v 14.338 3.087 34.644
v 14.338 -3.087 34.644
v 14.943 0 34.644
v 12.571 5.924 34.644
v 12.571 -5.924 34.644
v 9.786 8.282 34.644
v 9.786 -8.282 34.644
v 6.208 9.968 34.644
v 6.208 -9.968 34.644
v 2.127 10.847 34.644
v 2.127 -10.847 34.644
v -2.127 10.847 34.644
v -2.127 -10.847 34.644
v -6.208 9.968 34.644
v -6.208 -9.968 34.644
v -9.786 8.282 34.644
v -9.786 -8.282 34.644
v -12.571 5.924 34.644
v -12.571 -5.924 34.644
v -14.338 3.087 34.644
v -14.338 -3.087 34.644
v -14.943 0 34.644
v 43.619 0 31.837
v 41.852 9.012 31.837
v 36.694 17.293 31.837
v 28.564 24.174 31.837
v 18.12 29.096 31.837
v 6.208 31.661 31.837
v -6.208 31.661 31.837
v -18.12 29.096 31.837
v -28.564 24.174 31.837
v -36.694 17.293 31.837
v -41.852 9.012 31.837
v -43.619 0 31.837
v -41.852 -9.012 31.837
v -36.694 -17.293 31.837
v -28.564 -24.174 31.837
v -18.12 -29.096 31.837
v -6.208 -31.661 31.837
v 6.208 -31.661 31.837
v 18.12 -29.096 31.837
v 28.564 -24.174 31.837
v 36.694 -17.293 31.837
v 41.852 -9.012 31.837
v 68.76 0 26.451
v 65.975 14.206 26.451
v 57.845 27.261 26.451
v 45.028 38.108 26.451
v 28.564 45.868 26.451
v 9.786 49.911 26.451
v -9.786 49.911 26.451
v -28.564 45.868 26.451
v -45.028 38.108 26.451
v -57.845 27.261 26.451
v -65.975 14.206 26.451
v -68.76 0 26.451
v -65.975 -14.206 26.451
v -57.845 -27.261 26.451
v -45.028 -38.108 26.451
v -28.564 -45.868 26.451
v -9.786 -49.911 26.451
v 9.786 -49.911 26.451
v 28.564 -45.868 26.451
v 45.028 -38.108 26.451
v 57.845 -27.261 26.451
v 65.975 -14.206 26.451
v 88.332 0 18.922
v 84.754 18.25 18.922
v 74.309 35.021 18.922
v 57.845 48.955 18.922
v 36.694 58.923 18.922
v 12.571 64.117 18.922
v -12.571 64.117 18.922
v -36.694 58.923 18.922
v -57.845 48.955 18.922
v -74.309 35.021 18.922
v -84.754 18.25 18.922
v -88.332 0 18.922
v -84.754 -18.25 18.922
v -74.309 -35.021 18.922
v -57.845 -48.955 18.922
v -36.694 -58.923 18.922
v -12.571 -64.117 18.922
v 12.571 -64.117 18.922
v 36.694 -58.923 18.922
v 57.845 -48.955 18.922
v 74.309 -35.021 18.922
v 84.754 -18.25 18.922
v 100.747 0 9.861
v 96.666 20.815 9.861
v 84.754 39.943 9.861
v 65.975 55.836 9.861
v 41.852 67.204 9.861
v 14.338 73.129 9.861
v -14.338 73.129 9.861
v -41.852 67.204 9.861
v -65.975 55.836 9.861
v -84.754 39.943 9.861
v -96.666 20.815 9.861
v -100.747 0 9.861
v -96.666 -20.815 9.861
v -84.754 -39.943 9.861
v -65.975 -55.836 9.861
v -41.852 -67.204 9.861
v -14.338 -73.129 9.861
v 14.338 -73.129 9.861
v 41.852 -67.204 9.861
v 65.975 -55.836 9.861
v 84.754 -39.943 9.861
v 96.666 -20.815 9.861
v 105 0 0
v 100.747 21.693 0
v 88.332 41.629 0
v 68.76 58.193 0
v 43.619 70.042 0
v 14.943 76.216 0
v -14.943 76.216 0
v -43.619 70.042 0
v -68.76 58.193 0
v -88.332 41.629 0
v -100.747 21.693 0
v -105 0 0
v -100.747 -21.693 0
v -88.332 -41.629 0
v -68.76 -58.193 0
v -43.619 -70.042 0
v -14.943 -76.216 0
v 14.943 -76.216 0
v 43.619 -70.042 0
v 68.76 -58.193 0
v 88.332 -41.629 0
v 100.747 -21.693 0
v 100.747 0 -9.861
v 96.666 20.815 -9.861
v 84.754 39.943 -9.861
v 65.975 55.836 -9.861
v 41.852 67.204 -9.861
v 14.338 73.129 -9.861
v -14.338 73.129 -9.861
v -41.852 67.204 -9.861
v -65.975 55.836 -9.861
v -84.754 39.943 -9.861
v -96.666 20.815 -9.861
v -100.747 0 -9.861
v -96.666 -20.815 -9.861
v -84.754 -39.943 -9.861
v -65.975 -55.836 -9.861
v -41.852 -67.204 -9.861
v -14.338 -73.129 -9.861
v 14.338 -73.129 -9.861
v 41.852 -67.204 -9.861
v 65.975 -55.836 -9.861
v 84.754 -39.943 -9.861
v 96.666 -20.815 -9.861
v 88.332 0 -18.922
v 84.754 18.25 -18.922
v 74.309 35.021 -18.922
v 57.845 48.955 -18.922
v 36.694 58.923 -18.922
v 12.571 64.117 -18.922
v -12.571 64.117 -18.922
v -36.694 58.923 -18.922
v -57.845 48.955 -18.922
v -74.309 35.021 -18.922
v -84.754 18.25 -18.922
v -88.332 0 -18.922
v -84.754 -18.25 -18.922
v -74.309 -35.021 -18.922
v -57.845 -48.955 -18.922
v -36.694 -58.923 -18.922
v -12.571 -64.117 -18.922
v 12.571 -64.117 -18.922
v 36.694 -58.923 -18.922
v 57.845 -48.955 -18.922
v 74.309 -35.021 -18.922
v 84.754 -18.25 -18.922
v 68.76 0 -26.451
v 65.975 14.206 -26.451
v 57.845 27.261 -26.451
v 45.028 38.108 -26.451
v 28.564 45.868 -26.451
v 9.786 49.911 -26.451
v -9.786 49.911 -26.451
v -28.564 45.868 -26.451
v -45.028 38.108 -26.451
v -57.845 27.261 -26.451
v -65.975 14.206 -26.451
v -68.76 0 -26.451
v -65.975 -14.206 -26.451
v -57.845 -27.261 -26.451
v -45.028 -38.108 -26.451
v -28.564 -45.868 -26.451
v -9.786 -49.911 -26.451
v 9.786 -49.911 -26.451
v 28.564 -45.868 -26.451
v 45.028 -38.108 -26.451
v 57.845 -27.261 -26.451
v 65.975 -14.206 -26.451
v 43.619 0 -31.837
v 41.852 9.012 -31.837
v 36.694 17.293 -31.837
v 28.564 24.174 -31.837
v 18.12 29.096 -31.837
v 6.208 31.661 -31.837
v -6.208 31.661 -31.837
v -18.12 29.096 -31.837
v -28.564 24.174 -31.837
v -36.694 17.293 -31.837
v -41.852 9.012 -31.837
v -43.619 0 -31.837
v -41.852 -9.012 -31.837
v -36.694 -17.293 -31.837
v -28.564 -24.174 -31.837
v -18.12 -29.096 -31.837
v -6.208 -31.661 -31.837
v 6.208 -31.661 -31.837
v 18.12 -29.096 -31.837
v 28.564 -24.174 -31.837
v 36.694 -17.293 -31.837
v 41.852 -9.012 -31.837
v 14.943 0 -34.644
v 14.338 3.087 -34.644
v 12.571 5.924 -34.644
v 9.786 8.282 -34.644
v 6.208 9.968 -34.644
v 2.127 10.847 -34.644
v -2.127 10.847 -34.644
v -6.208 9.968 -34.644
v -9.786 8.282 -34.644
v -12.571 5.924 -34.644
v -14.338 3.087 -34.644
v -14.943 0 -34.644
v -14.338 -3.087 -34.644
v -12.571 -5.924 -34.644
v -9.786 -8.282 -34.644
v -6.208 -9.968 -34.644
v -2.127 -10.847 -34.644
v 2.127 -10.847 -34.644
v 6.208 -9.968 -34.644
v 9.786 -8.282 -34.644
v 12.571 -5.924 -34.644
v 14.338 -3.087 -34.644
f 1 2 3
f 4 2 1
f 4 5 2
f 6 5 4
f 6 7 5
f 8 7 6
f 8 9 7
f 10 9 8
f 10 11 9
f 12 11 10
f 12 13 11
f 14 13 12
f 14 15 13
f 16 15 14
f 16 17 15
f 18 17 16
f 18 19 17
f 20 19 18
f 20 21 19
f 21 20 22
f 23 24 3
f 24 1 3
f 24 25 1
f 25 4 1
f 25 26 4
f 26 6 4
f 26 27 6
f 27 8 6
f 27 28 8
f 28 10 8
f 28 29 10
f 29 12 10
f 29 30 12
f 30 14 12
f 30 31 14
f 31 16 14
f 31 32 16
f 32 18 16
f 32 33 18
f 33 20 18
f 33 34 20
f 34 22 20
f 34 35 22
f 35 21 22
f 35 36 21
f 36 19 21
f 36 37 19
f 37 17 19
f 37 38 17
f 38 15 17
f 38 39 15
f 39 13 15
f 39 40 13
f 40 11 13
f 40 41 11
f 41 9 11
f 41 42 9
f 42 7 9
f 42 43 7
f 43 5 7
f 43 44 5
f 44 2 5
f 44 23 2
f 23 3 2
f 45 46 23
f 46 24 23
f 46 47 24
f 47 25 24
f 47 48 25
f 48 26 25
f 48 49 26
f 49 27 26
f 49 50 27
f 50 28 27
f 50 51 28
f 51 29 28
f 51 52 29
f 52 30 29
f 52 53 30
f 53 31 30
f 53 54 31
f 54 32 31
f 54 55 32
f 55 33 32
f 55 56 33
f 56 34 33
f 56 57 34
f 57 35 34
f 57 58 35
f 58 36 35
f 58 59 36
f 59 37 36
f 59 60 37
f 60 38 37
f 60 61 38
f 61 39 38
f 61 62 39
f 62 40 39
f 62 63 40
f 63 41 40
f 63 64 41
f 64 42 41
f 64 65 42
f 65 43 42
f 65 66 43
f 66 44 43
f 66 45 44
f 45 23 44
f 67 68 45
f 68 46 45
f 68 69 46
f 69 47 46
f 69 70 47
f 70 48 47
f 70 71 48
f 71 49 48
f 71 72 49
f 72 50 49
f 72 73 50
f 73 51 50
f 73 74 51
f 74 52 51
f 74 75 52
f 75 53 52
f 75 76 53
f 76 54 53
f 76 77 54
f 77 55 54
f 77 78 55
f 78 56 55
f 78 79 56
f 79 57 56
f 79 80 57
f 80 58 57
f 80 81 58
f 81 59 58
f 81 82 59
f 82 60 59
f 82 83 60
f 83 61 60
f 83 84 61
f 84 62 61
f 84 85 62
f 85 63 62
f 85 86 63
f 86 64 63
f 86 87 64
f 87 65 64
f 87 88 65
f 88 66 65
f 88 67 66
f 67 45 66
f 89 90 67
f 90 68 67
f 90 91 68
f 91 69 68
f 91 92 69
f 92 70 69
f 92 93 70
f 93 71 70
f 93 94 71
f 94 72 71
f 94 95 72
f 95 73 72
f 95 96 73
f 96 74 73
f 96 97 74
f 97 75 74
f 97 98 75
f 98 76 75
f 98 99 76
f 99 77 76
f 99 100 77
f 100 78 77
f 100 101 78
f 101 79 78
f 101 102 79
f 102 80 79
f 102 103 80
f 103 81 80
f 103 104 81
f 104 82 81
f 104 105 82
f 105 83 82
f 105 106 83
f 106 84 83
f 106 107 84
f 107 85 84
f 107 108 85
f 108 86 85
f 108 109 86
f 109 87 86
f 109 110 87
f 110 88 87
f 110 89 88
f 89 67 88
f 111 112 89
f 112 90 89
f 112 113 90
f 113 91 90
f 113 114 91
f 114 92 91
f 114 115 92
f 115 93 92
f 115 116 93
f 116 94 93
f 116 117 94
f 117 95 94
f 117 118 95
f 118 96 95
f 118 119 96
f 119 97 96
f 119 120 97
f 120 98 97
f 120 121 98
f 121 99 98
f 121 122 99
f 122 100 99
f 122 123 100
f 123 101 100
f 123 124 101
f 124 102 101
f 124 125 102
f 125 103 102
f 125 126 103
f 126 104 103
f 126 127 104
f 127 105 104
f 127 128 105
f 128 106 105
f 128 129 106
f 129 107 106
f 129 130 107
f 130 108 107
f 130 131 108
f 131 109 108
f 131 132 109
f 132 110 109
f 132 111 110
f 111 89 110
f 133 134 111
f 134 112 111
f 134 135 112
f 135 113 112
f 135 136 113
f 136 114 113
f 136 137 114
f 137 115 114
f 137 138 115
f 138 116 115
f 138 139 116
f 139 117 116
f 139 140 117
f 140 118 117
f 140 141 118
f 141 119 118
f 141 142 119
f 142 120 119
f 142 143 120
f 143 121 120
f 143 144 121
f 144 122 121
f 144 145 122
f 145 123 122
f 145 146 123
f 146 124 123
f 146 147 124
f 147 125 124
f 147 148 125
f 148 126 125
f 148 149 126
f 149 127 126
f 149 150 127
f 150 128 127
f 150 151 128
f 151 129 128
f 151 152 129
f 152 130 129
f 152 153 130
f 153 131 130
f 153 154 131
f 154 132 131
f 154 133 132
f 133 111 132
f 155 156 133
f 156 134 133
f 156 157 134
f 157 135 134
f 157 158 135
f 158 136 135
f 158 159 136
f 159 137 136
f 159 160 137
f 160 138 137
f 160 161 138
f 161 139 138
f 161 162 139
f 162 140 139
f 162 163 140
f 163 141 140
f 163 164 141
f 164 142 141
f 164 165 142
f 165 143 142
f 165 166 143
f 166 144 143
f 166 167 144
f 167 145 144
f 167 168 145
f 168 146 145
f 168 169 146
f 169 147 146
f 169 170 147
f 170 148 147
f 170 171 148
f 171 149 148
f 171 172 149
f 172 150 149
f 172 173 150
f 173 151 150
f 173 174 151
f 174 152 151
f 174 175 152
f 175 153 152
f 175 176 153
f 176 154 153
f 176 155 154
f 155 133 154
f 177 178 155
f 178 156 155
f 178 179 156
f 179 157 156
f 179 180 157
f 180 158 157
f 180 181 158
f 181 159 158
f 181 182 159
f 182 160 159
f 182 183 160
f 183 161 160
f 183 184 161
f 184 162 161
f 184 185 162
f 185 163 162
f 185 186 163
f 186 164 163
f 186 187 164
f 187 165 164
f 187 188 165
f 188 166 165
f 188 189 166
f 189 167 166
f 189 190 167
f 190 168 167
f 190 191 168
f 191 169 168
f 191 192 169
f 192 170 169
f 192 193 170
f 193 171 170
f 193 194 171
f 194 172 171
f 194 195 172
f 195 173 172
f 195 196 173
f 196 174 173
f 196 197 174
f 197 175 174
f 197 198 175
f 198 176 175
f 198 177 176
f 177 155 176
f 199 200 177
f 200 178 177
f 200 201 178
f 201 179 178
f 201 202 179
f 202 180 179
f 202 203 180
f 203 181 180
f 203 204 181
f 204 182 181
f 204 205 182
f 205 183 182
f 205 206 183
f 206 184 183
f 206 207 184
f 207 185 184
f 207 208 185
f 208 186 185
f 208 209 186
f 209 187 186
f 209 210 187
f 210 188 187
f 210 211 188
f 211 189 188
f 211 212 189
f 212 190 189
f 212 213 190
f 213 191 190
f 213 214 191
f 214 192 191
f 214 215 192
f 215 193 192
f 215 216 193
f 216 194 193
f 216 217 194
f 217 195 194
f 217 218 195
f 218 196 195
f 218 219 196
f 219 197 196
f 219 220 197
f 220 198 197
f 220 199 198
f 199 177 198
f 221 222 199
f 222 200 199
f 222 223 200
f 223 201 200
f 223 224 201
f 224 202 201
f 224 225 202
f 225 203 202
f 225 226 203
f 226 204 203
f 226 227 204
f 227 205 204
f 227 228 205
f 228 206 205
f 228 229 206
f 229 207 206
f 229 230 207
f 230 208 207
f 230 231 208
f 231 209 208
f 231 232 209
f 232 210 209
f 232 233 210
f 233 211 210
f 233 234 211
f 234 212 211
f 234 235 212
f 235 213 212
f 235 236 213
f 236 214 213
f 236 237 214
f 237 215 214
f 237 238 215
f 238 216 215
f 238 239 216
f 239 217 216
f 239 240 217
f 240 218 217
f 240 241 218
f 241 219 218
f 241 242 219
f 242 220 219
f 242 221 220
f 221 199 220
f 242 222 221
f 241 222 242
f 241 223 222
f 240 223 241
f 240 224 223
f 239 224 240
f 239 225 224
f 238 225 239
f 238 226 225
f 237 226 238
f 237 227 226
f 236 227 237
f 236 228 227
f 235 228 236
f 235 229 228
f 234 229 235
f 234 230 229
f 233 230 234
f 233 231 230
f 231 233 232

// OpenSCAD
// Generated by SolidPython 1.0.1 on 2020-07-29 00:46:52


scale(v = [15, 11, 5]) {
	sphere(r = 7);
}
/***********************************************
*********      SolidPython code:      **********
************************************************
 
# import packages: SolidPython
from solid import *
from solid.utils import *
from itertools import chain, combinations, permutations


class Resize:

    def __init__(self, scad_file):
        self.scad_file = scad_file
        #self.scad_file = import_scad(scad_file)
        # cone/cylinder param:
        self.r1 = 0
        self.r2 = 0
        self.h = 0
        # rectangular prism param:
        self.w = 0
        self.l = 0
        # ellipse param:
        self.r = 0

    # import OpenScad code (file name corresponds to shape)


    # classify shape + parameters
    def assign(self, param1, param2, param3):
        if self.scad_file == 'cone.scad':
            self.r1 = param1
            self.r2 = param2
            self.h = param3
        elif self.scad_file == 'cylinder.scad':
            self.r1 = param1
            self.r2 = param2
            self.h = param3
        elif self.scad_file == 'rectangularPrism.scad':
            self.h = param1
            self.l = param2
            self.w = param3
        else:
            self.r = param1
            self.h = param2

    # resize parameters
    def iterate(self):
        x = range(3, 20, 2)
        i = 1
        if self.scad_file == 'cone.scad':
            tempList = list(permutations(x, 2))
            for temp in tempList:
                param1 = temp[0]
                param2 = temp[1]
                filepath = 'produced_scad_files/' + 'cone' + str(param1) + '_' + str(param2) + '_' + '.scad'
                scad_render_to_file(cylinder(h=param1, r1=param2, r2=0), filepath)

        elif self.scad_file == 'cylinder.scad':
            tempList = list(permutations(x, 3))
            for temp in tempList:
                param1 = temp[0]
                param2 = temp[1]
                filepath = 'produced_scad_files/' + 'cylinder' + str(param1) + '_' + str(param2) + '_' + '.scad'
                scad_render_to_file(cylinder(h=param1, r1=param2, r2=param2), filepath)

        elif self.scad_file == 'rectangularPrism.scad':
            tempList = list(permutations(x, 3))
            for temp in tempList:
                param1 = temp[0]
                param2 = temp[1]
                param3 = temp[2]
                filepath = 'produced_scad_files/' + 'rectangularPrism' + str(param1) + '_' + str(param2) + '_' + str(
                    param3) + '.scad'
                scad_render_to_file(cube(size=(param1, param2, param3)), filepath)

        elif self.scad_file == 'ellipse.scad':
            tempList = list(permutations(x, 4))
            for temp in tempList:
                param1 = temp[0]
                param2 = temp[1]
                param3 = temp[2]
                param4 = temp[3]
                filepath = 'produced_scad_files/' + 'ellipse' + str(param1) + '_' + str(param2) + '_' + str(param3) + '_' + str(param4) + '.scad'
                scad_render_to_file(scale([param1, param2, param3])(sphere(r=param4)), filepath)

    def render_to_scadfile(self):
        scad_render_to_file(scad, 'example.scad') 
 
************************************************/
